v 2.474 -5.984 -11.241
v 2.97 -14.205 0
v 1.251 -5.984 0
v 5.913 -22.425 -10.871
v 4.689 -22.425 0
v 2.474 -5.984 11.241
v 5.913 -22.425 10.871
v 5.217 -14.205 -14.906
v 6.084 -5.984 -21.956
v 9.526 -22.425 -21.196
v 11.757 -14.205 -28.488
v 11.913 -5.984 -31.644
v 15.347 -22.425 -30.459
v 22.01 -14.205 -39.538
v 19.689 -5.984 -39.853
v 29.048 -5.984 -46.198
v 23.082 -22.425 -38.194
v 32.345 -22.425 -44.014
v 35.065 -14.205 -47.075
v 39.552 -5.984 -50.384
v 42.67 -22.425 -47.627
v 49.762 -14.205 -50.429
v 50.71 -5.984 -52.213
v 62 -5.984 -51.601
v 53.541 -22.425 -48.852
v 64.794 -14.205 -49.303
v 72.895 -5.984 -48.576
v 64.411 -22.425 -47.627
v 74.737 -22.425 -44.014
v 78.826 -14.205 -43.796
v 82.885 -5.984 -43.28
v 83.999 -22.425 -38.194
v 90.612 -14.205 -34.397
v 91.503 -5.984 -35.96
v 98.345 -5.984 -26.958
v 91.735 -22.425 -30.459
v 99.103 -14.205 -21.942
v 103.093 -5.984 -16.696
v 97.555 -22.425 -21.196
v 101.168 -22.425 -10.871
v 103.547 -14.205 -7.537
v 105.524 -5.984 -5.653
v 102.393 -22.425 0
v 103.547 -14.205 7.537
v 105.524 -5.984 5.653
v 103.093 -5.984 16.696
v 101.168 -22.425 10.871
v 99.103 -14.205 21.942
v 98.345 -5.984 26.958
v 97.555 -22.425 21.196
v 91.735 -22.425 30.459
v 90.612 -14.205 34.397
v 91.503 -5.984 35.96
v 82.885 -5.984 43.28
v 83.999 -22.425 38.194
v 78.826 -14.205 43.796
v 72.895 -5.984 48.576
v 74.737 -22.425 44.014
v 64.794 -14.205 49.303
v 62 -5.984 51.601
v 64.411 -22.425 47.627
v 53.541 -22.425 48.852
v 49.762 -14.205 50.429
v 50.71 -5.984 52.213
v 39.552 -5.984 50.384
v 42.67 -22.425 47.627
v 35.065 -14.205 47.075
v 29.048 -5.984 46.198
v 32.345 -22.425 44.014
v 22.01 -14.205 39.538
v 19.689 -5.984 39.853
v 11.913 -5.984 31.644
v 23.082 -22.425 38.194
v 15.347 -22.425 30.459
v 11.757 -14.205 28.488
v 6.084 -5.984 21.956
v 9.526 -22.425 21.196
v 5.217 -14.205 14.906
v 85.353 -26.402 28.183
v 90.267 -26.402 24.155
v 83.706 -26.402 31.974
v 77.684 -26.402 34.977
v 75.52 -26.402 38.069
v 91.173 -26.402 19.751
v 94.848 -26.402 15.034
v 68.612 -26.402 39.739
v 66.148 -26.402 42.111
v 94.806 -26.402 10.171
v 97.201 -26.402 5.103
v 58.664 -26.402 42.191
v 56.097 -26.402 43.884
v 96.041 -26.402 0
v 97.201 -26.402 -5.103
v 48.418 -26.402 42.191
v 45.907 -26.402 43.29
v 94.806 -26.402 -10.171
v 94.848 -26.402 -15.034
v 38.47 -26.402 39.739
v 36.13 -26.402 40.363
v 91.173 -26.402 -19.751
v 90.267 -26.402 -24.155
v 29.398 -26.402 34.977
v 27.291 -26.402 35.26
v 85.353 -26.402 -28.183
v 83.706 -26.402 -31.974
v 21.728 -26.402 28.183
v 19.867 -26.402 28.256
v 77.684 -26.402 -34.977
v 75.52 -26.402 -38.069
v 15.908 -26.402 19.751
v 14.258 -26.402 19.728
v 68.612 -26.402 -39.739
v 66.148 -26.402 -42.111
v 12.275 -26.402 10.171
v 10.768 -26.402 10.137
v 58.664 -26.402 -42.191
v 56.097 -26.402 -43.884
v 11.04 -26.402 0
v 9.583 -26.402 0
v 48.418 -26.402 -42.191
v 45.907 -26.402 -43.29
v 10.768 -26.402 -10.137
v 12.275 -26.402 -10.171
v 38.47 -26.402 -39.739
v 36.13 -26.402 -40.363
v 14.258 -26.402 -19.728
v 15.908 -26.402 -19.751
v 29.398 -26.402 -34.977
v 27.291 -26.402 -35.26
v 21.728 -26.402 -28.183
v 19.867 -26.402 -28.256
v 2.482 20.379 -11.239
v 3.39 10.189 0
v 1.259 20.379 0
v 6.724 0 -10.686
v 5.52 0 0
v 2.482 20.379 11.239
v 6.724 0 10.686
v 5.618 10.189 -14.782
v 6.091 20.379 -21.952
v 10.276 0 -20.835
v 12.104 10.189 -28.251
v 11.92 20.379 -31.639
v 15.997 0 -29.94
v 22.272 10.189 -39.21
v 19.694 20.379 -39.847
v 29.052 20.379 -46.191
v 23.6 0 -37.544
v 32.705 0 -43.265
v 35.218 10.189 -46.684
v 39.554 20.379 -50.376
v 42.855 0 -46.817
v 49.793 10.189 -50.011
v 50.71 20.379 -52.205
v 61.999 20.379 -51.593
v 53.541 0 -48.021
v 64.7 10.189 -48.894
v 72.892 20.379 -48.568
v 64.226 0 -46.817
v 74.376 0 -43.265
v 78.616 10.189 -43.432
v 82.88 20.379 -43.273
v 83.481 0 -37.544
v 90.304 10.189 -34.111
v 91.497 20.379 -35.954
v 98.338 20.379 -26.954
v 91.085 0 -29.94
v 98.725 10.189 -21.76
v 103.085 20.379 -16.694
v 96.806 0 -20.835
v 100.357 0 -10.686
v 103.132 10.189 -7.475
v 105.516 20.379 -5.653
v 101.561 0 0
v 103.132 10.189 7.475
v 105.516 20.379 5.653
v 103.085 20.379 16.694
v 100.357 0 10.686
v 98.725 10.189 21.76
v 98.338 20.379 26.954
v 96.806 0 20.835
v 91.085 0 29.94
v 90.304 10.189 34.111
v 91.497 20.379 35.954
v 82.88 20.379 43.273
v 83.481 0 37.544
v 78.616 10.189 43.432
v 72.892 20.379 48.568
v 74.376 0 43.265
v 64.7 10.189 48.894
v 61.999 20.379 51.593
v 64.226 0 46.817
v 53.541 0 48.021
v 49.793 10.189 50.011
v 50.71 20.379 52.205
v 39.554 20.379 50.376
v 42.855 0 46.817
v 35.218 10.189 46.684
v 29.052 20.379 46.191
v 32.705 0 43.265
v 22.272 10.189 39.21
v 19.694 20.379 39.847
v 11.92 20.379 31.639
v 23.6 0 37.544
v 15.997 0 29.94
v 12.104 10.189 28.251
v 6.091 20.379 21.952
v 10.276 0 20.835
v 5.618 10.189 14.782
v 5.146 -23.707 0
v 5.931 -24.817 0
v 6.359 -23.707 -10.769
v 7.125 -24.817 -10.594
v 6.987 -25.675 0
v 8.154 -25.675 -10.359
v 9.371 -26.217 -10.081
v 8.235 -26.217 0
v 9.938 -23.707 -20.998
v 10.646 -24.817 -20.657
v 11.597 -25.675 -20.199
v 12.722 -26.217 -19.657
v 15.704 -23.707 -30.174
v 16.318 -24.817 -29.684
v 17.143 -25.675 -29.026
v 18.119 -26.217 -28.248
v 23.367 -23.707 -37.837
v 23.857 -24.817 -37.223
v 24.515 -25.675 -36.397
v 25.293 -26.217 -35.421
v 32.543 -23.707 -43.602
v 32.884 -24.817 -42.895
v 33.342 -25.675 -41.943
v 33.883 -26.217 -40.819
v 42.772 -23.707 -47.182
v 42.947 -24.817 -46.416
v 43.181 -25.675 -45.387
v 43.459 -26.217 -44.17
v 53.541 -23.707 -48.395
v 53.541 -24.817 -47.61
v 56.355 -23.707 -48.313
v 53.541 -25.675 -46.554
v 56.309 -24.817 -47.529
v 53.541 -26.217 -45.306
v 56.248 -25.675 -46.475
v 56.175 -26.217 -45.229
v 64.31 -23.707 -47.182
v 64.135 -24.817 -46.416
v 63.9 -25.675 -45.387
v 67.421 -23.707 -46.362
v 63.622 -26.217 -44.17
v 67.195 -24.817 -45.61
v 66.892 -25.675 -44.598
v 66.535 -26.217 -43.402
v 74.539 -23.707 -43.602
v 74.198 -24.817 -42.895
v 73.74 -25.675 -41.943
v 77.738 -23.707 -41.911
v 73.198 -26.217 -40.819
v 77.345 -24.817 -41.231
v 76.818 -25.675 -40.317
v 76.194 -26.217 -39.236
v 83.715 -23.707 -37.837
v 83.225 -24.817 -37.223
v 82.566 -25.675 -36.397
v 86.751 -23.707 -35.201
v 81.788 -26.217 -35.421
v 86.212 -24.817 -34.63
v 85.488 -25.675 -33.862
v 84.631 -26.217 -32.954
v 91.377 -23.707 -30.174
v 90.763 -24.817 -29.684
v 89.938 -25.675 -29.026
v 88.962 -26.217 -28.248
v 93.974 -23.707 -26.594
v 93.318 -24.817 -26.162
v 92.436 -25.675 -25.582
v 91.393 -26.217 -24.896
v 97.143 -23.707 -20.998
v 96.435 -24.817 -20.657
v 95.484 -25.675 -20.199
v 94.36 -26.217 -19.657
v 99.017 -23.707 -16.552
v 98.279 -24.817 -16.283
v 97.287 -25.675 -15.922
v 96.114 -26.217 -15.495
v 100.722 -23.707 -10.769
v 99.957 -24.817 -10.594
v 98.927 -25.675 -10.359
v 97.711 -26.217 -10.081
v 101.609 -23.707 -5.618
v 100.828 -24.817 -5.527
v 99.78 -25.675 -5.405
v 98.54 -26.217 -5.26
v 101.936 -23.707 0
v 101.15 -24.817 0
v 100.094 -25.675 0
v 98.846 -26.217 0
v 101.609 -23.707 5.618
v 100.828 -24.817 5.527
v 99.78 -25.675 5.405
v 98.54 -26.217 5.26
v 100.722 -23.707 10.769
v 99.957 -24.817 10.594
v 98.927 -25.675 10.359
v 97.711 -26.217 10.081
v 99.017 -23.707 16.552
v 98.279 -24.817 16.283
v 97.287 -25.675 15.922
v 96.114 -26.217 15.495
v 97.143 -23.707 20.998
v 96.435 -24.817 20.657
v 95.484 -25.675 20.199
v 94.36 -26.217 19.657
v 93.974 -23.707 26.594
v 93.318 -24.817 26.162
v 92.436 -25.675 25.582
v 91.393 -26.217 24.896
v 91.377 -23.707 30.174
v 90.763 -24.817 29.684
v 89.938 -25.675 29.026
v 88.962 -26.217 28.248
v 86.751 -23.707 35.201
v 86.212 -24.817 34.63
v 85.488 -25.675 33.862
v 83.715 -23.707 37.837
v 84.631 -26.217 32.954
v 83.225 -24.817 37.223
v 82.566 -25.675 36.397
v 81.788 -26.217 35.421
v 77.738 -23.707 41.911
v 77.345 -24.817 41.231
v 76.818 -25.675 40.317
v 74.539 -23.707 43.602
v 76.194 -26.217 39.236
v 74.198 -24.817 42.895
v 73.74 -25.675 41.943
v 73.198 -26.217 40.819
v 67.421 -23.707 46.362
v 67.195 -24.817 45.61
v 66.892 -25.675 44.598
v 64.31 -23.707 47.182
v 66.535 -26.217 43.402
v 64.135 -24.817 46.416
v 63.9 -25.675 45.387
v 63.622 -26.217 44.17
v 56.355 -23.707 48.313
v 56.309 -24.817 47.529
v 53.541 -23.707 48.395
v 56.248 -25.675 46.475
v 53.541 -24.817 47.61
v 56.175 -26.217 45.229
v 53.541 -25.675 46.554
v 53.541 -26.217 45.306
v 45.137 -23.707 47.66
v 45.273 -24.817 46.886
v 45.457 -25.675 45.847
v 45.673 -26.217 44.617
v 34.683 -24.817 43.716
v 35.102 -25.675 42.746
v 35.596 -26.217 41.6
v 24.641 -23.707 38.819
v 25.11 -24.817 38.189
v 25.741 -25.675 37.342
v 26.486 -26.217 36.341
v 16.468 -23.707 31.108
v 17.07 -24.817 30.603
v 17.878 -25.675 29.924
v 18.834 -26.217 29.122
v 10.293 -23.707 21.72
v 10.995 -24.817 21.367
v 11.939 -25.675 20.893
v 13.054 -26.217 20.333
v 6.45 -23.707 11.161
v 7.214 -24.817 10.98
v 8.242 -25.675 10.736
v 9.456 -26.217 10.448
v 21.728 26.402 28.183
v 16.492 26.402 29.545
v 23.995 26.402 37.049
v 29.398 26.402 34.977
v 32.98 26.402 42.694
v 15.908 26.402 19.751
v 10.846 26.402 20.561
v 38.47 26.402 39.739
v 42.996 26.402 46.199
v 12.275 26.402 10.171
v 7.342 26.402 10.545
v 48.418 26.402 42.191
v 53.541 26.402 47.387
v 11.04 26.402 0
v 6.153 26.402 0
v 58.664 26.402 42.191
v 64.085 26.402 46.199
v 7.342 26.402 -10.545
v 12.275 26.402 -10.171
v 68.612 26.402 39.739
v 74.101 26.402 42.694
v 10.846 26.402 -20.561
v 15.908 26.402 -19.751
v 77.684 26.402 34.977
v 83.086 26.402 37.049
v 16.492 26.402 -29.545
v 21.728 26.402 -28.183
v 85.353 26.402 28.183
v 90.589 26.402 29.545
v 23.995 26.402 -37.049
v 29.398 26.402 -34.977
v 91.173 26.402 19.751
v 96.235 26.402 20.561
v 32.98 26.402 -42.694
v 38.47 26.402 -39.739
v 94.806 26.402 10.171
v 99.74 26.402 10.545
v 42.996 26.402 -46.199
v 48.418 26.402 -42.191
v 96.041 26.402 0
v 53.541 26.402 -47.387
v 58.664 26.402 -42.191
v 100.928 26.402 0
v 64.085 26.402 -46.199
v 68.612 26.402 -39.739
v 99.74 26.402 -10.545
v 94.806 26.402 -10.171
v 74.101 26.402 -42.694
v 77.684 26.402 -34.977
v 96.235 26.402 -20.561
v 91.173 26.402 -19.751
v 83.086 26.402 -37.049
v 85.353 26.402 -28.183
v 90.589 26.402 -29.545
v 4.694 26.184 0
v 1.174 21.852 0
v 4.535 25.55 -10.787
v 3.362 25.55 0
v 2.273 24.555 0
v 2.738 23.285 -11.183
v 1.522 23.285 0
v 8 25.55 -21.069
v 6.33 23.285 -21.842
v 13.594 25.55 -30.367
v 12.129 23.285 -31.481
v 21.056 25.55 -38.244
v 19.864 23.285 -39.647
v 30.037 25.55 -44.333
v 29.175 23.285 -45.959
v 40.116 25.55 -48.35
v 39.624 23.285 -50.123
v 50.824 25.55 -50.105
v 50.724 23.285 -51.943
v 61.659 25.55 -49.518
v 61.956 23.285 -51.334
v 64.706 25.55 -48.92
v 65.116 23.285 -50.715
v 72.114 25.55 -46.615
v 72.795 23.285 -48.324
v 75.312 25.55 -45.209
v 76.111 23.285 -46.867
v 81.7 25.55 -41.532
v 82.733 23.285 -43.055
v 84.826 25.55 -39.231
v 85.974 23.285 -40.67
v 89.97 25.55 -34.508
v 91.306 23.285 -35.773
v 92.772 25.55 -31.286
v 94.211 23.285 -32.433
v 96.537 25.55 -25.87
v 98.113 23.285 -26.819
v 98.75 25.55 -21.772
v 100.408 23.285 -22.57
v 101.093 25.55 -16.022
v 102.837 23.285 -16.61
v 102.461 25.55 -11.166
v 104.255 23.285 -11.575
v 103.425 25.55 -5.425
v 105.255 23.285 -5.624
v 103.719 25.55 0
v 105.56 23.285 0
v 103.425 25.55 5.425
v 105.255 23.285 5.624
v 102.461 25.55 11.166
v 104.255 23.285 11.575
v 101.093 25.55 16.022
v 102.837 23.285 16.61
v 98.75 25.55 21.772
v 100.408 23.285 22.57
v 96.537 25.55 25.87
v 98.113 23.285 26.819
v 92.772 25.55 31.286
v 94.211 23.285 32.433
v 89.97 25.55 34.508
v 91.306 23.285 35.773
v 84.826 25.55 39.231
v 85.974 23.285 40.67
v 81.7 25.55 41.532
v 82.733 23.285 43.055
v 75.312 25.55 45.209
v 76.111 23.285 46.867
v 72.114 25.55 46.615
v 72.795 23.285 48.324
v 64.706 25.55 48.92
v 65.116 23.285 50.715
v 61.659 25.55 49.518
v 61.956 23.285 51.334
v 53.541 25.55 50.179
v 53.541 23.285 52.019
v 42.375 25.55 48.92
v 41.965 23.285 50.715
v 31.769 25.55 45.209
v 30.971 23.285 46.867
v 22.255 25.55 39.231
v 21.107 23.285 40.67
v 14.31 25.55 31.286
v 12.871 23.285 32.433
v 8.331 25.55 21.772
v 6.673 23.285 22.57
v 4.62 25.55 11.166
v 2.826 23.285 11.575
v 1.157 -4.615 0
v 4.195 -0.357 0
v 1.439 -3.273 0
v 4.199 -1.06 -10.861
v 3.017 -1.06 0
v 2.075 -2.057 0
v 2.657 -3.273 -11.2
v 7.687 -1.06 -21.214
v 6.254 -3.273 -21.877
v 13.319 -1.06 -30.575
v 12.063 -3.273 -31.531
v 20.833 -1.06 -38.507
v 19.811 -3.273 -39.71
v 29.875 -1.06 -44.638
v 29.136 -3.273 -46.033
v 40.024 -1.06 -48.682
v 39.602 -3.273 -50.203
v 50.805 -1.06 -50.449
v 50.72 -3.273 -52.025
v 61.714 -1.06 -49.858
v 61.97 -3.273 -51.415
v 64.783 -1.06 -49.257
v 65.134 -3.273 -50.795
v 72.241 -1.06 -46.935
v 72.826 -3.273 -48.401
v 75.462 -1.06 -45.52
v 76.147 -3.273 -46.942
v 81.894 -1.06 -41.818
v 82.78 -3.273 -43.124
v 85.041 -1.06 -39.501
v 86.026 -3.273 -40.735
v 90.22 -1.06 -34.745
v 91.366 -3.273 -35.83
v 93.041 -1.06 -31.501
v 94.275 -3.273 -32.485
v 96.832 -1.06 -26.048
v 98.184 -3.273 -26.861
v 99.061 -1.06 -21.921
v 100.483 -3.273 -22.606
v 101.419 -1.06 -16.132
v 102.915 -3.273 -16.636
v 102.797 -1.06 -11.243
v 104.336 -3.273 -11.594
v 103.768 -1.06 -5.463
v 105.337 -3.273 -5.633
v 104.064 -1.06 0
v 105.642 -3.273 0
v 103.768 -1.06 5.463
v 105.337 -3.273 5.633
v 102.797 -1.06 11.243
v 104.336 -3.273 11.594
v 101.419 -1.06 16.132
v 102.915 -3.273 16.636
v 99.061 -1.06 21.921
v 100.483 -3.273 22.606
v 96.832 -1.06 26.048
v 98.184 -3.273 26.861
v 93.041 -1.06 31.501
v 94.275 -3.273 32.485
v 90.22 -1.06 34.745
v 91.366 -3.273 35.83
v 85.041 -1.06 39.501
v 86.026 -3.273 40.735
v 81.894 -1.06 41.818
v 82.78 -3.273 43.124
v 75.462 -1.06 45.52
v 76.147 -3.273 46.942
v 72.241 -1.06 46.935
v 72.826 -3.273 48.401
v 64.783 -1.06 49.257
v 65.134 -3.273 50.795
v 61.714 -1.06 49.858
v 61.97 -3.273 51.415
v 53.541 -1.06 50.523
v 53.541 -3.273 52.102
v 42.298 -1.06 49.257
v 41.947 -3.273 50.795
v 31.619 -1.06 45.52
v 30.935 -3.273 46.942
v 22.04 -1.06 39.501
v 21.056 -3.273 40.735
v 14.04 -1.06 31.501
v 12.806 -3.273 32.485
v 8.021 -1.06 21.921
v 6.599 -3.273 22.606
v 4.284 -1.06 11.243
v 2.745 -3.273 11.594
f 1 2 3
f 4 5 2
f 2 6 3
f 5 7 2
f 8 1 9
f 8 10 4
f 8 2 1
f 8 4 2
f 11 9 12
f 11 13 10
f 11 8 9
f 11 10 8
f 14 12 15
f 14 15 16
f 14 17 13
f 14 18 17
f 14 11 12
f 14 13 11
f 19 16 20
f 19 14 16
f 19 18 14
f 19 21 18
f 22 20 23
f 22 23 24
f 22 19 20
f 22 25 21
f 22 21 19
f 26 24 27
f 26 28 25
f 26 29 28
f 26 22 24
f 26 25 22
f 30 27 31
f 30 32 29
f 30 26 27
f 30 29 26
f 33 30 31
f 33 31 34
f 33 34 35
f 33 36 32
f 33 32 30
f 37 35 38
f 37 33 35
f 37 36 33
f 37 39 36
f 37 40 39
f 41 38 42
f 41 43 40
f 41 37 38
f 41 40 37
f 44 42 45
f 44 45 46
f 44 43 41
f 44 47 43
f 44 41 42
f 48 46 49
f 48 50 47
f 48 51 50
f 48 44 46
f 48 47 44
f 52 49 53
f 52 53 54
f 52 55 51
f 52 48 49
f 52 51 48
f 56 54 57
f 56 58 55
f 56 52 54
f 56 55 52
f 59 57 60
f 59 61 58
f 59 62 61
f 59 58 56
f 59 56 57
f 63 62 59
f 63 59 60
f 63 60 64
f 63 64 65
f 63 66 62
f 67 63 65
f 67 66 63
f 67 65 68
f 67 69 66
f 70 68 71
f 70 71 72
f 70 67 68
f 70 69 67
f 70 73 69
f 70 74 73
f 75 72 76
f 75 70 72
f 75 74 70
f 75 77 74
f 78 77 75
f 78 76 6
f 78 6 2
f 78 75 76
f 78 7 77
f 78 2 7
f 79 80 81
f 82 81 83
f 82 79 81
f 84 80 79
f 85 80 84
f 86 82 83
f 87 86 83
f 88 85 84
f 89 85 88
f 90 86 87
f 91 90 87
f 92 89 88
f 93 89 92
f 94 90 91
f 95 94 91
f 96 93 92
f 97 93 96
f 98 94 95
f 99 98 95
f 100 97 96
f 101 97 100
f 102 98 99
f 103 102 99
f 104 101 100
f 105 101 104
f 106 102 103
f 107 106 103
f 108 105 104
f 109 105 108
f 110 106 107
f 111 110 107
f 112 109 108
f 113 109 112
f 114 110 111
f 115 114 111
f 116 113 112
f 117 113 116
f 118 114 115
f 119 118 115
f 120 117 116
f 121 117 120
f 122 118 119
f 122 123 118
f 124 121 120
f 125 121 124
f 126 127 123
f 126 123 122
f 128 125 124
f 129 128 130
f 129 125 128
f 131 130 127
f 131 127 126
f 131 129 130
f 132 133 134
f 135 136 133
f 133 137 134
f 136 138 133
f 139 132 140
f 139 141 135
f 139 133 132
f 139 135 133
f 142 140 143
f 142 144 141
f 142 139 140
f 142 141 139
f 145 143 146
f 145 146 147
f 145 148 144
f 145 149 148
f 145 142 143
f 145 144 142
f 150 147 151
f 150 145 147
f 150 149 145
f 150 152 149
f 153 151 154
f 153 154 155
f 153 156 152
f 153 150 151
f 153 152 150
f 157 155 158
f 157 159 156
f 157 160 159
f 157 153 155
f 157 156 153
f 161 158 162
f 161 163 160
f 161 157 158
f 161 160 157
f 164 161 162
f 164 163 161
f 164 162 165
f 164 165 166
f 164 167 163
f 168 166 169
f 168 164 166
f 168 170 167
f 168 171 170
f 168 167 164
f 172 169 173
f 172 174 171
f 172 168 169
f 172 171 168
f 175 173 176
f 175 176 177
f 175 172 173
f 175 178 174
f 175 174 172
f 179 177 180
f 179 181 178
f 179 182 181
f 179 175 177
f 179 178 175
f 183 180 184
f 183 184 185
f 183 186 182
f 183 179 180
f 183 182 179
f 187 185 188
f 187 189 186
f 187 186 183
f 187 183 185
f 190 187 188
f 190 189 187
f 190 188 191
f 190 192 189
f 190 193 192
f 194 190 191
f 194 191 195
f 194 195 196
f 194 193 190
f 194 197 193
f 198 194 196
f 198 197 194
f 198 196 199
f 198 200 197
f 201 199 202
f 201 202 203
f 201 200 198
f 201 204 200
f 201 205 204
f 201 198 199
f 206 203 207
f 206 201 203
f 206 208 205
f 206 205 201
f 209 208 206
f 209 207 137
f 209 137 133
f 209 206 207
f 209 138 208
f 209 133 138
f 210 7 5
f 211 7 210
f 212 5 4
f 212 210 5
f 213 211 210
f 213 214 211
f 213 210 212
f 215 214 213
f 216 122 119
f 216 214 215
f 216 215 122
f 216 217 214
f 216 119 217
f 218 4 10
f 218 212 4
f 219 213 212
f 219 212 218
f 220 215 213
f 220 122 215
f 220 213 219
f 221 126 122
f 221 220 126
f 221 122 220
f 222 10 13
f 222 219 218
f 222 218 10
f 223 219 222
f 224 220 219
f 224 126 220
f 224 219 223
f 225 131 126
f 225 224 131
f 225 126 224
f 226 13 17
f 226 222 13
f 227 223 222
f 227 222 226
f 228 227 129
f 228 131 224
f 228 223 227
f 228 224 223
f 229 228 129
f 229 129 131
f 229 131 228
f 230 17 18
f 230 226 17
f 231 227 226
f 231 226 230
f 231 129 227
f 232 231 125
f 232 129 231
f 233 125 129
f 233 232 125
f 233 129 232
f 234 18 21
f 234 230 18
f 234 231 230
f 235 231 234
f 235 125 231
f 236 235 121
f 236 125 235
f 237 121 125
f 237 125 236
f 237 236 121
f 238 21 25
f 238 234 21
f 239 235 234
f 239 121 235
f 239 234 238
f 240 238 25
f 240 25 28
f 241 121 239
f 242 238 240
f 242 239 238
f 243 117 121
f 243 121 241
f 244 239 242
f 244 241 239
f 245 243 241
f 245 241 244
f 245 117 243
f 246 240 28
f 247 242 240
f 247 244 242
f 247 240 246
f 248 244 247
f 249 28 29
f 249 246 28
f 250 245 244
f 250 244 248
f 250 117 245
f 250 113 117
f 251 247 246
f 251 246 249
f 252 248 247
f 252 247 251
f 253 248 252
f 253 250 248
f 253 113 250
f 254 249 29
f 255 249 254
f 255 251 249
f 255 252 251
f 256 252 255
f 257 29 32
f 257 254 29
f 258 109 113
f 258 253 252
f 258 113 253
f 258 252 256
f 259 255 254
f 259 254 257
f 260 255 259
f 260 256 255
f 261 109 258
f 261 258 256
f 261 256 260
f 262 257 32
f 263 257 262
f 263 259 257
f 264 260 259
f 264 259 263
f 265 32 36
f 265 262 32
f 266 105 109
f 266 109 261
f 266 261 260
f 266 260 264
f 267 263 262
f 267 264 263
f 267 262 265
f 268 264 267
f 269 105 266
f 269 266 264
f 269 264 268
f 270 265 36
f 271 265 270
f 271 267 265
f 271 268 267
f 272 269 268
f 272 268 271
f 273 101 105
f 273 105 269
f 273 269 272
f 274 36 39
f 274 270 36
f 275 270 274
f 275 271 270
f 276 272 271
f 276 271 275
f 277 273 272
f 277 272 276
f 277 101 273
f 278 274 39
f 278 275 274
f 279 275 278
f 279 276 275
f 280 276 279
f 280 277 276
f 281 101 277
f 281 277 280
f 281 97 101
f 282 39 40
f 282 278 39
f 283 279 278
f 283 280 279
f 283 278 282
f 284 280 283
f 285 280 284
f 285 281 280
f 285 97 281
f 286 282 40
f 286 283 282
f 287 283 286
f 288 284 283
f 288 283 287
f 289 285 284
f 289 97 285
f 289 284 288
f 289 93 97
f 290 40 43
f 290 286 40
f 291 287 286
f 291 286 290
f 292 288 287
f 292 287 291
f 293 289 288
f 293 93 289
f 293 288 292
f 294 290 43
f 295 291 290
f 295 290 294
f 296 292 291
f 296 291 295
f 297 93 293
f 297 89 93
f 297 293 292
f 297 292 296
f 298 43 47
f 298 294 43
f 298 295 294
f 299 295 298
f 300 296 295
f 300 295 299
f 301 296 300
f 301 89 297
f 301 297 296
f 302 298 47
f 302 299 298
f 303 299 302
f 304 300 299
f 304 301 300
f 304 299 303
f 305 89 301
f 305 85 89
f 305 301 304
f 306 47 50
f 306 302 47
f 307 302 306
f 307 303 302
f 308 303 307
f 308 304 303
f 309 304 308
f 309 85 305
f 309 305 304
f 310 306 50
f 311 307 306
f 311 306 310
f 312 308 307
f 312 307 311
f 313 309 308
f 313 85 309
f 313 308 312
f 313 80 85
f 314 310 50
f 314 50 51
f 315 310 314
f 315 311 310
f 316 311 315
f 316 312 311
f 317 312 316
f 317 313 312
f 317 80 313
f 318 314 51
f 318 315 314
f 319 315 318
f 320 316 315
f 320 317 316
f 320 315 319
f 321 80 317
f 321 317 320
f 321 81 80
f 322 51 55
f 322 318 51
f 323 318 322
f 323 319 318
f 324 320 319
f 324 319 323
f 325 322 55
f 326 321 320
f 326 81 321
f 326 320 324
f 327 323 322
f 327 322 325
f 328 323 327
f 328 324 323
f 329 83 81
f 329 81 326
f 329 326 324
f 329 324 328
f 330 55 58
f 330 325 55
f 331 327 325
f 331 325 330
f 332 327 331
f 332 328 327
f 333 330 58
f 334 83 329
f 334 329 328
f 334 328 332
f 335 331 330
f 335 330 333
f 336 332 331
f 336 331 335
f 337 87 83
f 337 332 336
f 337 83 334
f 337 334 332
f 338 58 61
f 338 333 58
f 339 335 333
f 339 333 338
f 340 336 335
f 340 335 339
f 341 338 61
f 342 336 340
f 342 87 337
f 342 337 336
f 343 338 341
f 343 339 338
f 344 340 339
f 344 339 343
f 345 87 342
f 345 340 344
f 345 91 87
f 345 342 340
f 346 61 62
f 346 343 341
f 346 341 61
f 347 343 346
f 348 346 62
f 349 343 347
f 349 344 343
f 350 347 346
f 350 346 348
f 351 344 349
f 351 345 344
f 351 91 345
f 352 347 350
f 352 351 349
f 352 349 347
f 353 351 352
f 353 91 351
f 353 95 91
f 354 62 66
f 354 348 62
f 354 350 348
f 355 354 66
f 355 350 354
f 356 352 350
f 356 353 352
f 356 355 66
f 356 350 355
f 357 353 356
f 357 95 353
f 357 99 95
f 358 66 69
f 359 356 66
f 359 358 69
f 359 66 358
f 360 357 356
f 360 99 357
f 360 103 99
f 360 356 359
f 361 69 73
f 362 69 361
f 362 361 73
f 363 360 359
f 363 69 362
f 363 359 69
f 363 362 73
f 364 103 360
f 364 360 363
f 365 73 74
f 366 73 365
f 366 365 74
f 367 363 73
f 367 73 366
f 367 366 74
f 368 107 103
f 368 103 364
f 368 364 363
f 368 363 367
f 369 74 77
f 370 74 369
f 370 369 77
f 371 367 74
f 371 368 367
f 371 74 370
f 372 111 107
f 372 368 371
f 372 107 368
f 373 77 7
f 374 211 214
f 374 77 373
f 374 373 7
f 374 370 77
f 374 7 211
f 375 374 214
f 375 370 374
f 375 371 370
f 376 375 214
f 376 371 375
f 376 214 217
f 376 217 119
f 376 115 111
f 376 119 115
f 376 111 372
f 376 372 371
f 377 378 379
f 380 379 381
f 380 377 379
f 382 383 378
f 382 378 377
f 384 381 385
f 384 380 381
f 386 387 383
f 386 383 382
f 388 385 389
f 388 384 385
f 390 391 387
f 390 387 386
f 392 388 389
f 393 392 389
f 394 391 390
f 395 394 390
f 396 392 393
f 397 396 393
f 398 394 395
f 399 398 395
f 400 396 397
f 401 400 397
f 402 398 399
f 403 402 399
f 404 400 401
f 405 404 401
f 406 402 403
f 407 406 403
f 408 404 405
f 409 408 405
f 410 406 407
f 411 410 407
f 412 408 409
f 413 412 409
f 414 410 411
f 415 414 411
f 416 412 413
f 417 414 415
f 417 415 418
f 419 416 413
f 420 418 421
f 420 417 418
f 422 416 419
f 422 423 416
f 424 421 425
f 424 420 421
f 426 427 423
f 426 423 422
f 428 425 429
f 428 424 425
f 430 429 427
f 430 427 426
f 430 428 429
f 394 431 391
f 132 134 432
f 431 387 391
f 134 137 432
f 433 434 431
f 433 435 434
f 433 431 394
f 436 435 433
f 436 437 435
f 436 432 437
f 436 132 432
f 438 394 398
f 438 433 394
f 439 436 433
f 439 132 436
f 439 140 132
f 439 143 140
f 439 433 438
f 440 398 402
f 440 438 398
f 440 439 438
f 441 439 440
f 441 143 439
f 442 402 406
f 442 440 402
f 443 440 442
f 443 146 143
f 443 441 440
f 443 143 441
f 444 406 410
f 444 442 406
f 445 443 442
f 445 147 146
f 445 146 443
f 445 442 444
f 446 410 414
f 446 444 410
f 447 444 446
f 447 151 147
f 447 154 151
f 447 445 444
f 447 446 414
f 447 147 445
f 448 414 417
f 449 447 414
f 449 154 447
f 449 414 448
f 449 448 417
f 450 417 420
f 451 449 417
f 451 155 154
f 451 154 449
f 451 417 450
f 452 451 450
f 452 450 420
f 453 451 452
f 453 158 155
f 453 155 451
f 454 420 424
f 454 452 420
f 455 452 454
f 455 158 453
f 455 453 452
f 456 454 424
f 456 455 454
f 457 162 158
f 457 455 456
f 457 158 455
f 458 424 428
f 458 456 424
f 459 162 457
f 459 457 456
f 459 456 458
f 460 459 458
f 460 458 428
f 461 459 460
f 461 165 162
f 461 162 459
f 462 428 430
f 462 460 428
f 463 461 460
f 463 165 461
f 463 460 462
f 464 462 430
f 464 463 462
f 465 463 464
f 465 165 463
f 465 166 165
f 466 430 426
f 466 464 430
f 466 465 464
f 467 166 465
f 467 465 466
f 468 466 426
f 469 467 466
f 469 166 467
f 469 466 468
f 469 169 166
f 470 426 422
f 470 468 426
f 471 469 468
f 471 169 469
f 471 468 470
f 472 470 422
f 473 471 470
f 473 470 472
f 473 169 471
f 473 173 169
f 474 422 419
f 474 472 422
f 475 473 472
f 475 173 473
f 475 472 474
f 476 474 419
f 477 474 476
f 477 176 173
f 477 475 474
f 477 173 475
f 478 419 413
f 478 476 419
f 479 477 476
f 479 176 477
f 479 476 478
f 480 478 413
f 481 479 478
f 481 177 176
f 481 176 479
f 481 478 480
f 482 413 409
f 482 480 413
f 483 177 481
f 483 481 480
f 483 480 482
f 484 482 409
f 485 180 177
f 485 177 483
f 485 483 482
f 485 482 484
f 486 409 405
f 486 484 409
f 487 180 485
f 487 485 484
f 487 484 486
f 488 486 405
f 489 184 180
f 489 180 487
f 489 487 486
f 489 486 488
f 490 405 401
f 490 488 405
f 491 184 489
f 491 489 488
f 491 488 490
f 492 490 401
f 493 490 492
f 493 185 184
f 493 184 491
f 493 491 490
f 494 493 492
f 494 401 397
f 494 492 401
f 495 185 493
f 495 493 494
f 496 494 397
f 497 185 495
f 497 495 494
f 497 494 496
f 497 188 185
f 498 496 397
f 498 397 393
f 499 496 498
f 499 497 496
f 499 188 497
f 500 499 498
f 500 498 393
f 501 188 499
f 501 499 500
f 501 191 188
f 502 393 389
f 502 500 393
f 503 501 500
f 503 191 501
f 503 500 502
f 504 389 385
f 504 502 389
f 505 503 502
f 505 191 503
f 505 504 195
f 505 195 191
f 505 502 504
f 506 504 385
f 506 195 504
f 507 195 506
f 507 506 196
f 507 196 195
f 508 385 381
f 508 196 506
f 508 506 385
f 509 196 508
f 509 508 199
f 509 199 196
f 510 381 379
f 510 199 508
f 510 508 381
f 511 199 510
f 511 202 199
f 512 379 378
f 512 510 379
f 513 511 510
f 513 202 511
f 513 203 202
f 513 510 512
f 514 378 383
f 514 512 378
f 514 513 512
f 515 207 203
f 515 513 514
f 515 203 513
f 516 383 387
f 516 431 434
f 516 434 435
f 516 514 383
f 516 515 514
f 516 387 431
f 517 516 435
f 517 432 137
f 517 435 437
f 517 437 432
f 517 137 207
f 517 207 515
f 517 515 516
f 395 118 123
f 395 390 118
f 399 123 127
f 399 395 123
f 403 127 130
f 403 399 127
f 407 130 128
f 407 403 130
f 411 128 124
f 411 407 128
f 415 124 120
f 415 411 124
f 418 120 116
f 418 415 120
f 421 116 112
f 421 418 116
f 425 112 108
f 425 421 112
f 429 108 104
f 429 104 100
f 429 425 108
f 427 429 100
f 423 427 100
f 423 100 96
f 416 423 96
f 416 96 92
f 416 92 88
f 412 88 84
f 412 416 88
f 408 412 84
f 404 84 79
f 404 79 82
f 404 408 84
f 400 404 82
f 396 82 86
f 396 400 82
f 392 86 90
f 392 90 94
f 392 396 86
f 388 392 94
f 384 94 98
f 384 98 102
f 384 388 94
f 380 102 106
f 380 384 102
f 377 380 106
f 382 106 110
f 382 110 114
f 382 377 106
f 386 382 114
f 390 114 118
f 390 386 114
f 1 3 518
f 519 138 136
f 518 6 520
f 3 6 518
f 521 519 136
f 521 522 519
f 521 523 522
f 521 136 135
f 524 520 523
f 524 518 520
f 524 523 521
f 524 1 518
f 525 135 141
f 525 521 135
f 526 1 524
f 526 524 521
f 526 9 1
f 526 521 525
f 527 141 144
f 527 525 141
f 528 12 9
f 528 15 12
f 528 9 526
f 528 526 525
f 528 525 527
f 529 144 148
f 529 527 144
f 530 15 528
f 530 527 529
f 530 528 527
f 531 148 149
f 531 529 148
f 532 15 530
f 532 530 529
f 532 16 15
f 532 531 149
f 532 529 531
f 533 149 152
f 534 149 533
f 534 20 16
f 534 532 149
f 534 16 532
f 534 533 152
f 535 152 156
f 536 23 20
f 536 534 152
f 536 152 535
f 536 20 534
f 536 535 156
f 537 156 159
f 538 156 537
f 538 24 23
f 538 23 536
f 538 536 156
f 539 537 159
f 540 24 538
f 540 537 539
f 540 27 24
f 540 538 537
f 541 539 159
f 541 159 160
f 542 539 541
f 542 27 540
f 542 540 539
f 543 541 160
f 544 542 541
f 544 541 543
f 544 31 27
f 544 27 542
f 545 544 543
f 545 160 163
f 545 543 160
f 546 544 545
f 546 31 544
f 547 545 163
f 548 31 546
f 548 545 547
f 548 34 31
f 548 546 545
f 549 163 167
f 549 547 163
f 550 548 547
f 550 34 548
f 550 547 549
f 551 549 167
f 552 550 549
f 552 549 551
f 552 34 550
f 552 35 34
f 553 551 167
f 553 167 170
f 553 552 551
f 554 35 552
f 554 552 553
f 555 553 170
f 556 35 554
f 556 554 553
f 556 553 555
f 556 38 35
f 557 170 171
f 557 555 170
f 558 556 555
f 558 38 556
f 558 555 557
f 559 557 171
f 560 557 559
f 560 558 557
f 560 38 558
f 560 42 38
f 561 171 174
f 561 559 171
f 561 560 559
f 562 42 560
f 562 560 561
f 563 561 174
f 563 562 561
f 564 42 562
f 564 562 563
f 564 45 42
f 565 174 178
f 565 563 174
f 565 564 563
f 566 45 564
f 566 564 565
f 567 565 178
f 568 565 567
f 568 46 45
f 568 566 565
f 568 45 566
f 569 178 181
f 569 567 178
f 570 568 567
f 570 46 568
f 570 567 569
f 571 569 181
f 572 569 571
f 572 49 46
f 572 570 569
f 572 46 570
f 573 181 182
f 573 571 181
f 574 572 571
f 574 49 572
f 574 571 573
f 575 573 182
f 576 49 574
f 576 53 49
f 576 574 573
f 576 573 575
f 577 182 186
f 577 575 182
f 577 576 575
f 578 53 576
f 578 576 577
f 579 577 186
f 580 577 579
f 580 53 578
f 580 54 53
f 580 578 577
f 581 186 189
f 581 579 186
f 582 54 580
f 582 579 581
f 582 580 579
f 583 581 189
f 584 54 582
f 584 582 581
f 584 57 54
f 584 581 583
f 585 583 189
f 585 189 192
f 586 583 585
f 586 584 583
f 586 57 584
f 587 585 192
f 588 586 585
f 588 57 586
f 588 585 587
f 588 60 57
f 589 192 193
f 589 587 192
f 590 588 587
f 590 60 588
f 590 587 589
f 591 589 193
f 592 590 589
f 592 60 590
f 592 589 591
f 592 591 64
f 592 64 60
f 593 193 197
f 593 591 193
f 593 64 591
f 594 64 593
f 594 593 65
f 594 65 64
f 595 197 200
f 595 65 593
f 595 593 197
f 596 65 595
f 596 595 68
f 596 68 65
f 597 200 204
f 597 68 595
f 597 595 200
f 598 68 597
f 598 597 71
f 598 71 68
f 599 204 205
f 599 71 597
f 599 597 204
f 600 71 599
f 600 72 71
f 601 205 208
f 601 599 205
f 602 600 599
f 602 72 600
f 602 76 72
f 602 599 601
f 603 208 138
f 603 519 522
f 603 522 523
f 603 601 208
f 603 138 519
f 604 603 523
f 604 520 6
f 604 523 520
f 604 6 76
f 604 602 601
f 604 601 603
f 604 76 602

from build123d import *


# Not quite as in the source:
# - a fillet or chamfer that OpenCascade refuses, or shapes differently, is made with other operations: its cross-section is extruded or revolved along the edge and cut away or added


with BuildPart() as f1:
    # F0 (on Top) → F1 (revolve)
    with BuildSketch(Plane.XY):
        Polygon((11.0400244594, -26.4020487666), (11.0400244594, 26.4020487666), (5.5200122297, 26.4020487666), (5.5200122297, 0), (5.5200122297, -26.4020487666), align=None)
        Polygon((0, 0), (5.5200122297, -26.4020487666), (5.5200122297, 0), align=None)
        Polygon((5.5200122297, 0), (5.5200122297, 26.4020487666), (0, 26.4020487666), align=None)
    revolve(axis=Axis((53.5406768322, 0, 0), (0, -1, 0)))

    # F2: fillet of radius 5 on 3 edges, made by hand

    # F2_s1 → F2_t2 (revolve, cut)
    with BuildSketch(Plane.XY):
        with BuildLine():
            ThreePointArc((6.1534879532, 26.4020487666), (2.2730077773, 24.5551224424), (1.2593119965, 20.3787982085))
            Line((1.2593119965, 20.3787982085), (0, 26.4020487666))
            Line((0, 26.4020487666), (6.1534879532, 26.4020487666))
        make_face()
    revolve(axis=Axis((53.5406768322, 26.4020487666, 0), (0, -1, 0)), mode=Mode.SUBTRACT)

    # F2_s3 → F2_t4 (revolve, cut)
    with BuildSketch(Plane.XY):
        with BuildLine():
            ThreePointArc((5.5200122297, 0), (2.0748843765, -2.0569822638), (1.2511057448, -5.9840003086))
            Line((1.2511057448, -5.9840003086), (0, 0))
            Line((0, 0), (5.5200122297, 0))
        make_face()
    revolve(axis=Axis((53.5406768322, 0, 0), (0, -1, 0)), mode=Mode.SUBTRACT)

    # F2_s5 → F2_t6 (revolve, cut)
    with BuildSketch(Plane.XY):
        with BuildLine():
            ThreePointArc((4.6885727551, -22.4252993247), (6.4296750361, -25.2825289425), (9.5827487118, -26.4020487666))
            Line((9.5827487118, -26.4020487666), (5.5200122297, -26.4020487666))
            Line((5.5200122297, -26.4020487666), (4.6885727551, -22.4252993247))
        make_face()
    revolve(axis=Axis((53.5406768322, -26.4020487666, 0), (0, -1, 0)), mode=Mode.SUBTRACT)


solid = f1.part
